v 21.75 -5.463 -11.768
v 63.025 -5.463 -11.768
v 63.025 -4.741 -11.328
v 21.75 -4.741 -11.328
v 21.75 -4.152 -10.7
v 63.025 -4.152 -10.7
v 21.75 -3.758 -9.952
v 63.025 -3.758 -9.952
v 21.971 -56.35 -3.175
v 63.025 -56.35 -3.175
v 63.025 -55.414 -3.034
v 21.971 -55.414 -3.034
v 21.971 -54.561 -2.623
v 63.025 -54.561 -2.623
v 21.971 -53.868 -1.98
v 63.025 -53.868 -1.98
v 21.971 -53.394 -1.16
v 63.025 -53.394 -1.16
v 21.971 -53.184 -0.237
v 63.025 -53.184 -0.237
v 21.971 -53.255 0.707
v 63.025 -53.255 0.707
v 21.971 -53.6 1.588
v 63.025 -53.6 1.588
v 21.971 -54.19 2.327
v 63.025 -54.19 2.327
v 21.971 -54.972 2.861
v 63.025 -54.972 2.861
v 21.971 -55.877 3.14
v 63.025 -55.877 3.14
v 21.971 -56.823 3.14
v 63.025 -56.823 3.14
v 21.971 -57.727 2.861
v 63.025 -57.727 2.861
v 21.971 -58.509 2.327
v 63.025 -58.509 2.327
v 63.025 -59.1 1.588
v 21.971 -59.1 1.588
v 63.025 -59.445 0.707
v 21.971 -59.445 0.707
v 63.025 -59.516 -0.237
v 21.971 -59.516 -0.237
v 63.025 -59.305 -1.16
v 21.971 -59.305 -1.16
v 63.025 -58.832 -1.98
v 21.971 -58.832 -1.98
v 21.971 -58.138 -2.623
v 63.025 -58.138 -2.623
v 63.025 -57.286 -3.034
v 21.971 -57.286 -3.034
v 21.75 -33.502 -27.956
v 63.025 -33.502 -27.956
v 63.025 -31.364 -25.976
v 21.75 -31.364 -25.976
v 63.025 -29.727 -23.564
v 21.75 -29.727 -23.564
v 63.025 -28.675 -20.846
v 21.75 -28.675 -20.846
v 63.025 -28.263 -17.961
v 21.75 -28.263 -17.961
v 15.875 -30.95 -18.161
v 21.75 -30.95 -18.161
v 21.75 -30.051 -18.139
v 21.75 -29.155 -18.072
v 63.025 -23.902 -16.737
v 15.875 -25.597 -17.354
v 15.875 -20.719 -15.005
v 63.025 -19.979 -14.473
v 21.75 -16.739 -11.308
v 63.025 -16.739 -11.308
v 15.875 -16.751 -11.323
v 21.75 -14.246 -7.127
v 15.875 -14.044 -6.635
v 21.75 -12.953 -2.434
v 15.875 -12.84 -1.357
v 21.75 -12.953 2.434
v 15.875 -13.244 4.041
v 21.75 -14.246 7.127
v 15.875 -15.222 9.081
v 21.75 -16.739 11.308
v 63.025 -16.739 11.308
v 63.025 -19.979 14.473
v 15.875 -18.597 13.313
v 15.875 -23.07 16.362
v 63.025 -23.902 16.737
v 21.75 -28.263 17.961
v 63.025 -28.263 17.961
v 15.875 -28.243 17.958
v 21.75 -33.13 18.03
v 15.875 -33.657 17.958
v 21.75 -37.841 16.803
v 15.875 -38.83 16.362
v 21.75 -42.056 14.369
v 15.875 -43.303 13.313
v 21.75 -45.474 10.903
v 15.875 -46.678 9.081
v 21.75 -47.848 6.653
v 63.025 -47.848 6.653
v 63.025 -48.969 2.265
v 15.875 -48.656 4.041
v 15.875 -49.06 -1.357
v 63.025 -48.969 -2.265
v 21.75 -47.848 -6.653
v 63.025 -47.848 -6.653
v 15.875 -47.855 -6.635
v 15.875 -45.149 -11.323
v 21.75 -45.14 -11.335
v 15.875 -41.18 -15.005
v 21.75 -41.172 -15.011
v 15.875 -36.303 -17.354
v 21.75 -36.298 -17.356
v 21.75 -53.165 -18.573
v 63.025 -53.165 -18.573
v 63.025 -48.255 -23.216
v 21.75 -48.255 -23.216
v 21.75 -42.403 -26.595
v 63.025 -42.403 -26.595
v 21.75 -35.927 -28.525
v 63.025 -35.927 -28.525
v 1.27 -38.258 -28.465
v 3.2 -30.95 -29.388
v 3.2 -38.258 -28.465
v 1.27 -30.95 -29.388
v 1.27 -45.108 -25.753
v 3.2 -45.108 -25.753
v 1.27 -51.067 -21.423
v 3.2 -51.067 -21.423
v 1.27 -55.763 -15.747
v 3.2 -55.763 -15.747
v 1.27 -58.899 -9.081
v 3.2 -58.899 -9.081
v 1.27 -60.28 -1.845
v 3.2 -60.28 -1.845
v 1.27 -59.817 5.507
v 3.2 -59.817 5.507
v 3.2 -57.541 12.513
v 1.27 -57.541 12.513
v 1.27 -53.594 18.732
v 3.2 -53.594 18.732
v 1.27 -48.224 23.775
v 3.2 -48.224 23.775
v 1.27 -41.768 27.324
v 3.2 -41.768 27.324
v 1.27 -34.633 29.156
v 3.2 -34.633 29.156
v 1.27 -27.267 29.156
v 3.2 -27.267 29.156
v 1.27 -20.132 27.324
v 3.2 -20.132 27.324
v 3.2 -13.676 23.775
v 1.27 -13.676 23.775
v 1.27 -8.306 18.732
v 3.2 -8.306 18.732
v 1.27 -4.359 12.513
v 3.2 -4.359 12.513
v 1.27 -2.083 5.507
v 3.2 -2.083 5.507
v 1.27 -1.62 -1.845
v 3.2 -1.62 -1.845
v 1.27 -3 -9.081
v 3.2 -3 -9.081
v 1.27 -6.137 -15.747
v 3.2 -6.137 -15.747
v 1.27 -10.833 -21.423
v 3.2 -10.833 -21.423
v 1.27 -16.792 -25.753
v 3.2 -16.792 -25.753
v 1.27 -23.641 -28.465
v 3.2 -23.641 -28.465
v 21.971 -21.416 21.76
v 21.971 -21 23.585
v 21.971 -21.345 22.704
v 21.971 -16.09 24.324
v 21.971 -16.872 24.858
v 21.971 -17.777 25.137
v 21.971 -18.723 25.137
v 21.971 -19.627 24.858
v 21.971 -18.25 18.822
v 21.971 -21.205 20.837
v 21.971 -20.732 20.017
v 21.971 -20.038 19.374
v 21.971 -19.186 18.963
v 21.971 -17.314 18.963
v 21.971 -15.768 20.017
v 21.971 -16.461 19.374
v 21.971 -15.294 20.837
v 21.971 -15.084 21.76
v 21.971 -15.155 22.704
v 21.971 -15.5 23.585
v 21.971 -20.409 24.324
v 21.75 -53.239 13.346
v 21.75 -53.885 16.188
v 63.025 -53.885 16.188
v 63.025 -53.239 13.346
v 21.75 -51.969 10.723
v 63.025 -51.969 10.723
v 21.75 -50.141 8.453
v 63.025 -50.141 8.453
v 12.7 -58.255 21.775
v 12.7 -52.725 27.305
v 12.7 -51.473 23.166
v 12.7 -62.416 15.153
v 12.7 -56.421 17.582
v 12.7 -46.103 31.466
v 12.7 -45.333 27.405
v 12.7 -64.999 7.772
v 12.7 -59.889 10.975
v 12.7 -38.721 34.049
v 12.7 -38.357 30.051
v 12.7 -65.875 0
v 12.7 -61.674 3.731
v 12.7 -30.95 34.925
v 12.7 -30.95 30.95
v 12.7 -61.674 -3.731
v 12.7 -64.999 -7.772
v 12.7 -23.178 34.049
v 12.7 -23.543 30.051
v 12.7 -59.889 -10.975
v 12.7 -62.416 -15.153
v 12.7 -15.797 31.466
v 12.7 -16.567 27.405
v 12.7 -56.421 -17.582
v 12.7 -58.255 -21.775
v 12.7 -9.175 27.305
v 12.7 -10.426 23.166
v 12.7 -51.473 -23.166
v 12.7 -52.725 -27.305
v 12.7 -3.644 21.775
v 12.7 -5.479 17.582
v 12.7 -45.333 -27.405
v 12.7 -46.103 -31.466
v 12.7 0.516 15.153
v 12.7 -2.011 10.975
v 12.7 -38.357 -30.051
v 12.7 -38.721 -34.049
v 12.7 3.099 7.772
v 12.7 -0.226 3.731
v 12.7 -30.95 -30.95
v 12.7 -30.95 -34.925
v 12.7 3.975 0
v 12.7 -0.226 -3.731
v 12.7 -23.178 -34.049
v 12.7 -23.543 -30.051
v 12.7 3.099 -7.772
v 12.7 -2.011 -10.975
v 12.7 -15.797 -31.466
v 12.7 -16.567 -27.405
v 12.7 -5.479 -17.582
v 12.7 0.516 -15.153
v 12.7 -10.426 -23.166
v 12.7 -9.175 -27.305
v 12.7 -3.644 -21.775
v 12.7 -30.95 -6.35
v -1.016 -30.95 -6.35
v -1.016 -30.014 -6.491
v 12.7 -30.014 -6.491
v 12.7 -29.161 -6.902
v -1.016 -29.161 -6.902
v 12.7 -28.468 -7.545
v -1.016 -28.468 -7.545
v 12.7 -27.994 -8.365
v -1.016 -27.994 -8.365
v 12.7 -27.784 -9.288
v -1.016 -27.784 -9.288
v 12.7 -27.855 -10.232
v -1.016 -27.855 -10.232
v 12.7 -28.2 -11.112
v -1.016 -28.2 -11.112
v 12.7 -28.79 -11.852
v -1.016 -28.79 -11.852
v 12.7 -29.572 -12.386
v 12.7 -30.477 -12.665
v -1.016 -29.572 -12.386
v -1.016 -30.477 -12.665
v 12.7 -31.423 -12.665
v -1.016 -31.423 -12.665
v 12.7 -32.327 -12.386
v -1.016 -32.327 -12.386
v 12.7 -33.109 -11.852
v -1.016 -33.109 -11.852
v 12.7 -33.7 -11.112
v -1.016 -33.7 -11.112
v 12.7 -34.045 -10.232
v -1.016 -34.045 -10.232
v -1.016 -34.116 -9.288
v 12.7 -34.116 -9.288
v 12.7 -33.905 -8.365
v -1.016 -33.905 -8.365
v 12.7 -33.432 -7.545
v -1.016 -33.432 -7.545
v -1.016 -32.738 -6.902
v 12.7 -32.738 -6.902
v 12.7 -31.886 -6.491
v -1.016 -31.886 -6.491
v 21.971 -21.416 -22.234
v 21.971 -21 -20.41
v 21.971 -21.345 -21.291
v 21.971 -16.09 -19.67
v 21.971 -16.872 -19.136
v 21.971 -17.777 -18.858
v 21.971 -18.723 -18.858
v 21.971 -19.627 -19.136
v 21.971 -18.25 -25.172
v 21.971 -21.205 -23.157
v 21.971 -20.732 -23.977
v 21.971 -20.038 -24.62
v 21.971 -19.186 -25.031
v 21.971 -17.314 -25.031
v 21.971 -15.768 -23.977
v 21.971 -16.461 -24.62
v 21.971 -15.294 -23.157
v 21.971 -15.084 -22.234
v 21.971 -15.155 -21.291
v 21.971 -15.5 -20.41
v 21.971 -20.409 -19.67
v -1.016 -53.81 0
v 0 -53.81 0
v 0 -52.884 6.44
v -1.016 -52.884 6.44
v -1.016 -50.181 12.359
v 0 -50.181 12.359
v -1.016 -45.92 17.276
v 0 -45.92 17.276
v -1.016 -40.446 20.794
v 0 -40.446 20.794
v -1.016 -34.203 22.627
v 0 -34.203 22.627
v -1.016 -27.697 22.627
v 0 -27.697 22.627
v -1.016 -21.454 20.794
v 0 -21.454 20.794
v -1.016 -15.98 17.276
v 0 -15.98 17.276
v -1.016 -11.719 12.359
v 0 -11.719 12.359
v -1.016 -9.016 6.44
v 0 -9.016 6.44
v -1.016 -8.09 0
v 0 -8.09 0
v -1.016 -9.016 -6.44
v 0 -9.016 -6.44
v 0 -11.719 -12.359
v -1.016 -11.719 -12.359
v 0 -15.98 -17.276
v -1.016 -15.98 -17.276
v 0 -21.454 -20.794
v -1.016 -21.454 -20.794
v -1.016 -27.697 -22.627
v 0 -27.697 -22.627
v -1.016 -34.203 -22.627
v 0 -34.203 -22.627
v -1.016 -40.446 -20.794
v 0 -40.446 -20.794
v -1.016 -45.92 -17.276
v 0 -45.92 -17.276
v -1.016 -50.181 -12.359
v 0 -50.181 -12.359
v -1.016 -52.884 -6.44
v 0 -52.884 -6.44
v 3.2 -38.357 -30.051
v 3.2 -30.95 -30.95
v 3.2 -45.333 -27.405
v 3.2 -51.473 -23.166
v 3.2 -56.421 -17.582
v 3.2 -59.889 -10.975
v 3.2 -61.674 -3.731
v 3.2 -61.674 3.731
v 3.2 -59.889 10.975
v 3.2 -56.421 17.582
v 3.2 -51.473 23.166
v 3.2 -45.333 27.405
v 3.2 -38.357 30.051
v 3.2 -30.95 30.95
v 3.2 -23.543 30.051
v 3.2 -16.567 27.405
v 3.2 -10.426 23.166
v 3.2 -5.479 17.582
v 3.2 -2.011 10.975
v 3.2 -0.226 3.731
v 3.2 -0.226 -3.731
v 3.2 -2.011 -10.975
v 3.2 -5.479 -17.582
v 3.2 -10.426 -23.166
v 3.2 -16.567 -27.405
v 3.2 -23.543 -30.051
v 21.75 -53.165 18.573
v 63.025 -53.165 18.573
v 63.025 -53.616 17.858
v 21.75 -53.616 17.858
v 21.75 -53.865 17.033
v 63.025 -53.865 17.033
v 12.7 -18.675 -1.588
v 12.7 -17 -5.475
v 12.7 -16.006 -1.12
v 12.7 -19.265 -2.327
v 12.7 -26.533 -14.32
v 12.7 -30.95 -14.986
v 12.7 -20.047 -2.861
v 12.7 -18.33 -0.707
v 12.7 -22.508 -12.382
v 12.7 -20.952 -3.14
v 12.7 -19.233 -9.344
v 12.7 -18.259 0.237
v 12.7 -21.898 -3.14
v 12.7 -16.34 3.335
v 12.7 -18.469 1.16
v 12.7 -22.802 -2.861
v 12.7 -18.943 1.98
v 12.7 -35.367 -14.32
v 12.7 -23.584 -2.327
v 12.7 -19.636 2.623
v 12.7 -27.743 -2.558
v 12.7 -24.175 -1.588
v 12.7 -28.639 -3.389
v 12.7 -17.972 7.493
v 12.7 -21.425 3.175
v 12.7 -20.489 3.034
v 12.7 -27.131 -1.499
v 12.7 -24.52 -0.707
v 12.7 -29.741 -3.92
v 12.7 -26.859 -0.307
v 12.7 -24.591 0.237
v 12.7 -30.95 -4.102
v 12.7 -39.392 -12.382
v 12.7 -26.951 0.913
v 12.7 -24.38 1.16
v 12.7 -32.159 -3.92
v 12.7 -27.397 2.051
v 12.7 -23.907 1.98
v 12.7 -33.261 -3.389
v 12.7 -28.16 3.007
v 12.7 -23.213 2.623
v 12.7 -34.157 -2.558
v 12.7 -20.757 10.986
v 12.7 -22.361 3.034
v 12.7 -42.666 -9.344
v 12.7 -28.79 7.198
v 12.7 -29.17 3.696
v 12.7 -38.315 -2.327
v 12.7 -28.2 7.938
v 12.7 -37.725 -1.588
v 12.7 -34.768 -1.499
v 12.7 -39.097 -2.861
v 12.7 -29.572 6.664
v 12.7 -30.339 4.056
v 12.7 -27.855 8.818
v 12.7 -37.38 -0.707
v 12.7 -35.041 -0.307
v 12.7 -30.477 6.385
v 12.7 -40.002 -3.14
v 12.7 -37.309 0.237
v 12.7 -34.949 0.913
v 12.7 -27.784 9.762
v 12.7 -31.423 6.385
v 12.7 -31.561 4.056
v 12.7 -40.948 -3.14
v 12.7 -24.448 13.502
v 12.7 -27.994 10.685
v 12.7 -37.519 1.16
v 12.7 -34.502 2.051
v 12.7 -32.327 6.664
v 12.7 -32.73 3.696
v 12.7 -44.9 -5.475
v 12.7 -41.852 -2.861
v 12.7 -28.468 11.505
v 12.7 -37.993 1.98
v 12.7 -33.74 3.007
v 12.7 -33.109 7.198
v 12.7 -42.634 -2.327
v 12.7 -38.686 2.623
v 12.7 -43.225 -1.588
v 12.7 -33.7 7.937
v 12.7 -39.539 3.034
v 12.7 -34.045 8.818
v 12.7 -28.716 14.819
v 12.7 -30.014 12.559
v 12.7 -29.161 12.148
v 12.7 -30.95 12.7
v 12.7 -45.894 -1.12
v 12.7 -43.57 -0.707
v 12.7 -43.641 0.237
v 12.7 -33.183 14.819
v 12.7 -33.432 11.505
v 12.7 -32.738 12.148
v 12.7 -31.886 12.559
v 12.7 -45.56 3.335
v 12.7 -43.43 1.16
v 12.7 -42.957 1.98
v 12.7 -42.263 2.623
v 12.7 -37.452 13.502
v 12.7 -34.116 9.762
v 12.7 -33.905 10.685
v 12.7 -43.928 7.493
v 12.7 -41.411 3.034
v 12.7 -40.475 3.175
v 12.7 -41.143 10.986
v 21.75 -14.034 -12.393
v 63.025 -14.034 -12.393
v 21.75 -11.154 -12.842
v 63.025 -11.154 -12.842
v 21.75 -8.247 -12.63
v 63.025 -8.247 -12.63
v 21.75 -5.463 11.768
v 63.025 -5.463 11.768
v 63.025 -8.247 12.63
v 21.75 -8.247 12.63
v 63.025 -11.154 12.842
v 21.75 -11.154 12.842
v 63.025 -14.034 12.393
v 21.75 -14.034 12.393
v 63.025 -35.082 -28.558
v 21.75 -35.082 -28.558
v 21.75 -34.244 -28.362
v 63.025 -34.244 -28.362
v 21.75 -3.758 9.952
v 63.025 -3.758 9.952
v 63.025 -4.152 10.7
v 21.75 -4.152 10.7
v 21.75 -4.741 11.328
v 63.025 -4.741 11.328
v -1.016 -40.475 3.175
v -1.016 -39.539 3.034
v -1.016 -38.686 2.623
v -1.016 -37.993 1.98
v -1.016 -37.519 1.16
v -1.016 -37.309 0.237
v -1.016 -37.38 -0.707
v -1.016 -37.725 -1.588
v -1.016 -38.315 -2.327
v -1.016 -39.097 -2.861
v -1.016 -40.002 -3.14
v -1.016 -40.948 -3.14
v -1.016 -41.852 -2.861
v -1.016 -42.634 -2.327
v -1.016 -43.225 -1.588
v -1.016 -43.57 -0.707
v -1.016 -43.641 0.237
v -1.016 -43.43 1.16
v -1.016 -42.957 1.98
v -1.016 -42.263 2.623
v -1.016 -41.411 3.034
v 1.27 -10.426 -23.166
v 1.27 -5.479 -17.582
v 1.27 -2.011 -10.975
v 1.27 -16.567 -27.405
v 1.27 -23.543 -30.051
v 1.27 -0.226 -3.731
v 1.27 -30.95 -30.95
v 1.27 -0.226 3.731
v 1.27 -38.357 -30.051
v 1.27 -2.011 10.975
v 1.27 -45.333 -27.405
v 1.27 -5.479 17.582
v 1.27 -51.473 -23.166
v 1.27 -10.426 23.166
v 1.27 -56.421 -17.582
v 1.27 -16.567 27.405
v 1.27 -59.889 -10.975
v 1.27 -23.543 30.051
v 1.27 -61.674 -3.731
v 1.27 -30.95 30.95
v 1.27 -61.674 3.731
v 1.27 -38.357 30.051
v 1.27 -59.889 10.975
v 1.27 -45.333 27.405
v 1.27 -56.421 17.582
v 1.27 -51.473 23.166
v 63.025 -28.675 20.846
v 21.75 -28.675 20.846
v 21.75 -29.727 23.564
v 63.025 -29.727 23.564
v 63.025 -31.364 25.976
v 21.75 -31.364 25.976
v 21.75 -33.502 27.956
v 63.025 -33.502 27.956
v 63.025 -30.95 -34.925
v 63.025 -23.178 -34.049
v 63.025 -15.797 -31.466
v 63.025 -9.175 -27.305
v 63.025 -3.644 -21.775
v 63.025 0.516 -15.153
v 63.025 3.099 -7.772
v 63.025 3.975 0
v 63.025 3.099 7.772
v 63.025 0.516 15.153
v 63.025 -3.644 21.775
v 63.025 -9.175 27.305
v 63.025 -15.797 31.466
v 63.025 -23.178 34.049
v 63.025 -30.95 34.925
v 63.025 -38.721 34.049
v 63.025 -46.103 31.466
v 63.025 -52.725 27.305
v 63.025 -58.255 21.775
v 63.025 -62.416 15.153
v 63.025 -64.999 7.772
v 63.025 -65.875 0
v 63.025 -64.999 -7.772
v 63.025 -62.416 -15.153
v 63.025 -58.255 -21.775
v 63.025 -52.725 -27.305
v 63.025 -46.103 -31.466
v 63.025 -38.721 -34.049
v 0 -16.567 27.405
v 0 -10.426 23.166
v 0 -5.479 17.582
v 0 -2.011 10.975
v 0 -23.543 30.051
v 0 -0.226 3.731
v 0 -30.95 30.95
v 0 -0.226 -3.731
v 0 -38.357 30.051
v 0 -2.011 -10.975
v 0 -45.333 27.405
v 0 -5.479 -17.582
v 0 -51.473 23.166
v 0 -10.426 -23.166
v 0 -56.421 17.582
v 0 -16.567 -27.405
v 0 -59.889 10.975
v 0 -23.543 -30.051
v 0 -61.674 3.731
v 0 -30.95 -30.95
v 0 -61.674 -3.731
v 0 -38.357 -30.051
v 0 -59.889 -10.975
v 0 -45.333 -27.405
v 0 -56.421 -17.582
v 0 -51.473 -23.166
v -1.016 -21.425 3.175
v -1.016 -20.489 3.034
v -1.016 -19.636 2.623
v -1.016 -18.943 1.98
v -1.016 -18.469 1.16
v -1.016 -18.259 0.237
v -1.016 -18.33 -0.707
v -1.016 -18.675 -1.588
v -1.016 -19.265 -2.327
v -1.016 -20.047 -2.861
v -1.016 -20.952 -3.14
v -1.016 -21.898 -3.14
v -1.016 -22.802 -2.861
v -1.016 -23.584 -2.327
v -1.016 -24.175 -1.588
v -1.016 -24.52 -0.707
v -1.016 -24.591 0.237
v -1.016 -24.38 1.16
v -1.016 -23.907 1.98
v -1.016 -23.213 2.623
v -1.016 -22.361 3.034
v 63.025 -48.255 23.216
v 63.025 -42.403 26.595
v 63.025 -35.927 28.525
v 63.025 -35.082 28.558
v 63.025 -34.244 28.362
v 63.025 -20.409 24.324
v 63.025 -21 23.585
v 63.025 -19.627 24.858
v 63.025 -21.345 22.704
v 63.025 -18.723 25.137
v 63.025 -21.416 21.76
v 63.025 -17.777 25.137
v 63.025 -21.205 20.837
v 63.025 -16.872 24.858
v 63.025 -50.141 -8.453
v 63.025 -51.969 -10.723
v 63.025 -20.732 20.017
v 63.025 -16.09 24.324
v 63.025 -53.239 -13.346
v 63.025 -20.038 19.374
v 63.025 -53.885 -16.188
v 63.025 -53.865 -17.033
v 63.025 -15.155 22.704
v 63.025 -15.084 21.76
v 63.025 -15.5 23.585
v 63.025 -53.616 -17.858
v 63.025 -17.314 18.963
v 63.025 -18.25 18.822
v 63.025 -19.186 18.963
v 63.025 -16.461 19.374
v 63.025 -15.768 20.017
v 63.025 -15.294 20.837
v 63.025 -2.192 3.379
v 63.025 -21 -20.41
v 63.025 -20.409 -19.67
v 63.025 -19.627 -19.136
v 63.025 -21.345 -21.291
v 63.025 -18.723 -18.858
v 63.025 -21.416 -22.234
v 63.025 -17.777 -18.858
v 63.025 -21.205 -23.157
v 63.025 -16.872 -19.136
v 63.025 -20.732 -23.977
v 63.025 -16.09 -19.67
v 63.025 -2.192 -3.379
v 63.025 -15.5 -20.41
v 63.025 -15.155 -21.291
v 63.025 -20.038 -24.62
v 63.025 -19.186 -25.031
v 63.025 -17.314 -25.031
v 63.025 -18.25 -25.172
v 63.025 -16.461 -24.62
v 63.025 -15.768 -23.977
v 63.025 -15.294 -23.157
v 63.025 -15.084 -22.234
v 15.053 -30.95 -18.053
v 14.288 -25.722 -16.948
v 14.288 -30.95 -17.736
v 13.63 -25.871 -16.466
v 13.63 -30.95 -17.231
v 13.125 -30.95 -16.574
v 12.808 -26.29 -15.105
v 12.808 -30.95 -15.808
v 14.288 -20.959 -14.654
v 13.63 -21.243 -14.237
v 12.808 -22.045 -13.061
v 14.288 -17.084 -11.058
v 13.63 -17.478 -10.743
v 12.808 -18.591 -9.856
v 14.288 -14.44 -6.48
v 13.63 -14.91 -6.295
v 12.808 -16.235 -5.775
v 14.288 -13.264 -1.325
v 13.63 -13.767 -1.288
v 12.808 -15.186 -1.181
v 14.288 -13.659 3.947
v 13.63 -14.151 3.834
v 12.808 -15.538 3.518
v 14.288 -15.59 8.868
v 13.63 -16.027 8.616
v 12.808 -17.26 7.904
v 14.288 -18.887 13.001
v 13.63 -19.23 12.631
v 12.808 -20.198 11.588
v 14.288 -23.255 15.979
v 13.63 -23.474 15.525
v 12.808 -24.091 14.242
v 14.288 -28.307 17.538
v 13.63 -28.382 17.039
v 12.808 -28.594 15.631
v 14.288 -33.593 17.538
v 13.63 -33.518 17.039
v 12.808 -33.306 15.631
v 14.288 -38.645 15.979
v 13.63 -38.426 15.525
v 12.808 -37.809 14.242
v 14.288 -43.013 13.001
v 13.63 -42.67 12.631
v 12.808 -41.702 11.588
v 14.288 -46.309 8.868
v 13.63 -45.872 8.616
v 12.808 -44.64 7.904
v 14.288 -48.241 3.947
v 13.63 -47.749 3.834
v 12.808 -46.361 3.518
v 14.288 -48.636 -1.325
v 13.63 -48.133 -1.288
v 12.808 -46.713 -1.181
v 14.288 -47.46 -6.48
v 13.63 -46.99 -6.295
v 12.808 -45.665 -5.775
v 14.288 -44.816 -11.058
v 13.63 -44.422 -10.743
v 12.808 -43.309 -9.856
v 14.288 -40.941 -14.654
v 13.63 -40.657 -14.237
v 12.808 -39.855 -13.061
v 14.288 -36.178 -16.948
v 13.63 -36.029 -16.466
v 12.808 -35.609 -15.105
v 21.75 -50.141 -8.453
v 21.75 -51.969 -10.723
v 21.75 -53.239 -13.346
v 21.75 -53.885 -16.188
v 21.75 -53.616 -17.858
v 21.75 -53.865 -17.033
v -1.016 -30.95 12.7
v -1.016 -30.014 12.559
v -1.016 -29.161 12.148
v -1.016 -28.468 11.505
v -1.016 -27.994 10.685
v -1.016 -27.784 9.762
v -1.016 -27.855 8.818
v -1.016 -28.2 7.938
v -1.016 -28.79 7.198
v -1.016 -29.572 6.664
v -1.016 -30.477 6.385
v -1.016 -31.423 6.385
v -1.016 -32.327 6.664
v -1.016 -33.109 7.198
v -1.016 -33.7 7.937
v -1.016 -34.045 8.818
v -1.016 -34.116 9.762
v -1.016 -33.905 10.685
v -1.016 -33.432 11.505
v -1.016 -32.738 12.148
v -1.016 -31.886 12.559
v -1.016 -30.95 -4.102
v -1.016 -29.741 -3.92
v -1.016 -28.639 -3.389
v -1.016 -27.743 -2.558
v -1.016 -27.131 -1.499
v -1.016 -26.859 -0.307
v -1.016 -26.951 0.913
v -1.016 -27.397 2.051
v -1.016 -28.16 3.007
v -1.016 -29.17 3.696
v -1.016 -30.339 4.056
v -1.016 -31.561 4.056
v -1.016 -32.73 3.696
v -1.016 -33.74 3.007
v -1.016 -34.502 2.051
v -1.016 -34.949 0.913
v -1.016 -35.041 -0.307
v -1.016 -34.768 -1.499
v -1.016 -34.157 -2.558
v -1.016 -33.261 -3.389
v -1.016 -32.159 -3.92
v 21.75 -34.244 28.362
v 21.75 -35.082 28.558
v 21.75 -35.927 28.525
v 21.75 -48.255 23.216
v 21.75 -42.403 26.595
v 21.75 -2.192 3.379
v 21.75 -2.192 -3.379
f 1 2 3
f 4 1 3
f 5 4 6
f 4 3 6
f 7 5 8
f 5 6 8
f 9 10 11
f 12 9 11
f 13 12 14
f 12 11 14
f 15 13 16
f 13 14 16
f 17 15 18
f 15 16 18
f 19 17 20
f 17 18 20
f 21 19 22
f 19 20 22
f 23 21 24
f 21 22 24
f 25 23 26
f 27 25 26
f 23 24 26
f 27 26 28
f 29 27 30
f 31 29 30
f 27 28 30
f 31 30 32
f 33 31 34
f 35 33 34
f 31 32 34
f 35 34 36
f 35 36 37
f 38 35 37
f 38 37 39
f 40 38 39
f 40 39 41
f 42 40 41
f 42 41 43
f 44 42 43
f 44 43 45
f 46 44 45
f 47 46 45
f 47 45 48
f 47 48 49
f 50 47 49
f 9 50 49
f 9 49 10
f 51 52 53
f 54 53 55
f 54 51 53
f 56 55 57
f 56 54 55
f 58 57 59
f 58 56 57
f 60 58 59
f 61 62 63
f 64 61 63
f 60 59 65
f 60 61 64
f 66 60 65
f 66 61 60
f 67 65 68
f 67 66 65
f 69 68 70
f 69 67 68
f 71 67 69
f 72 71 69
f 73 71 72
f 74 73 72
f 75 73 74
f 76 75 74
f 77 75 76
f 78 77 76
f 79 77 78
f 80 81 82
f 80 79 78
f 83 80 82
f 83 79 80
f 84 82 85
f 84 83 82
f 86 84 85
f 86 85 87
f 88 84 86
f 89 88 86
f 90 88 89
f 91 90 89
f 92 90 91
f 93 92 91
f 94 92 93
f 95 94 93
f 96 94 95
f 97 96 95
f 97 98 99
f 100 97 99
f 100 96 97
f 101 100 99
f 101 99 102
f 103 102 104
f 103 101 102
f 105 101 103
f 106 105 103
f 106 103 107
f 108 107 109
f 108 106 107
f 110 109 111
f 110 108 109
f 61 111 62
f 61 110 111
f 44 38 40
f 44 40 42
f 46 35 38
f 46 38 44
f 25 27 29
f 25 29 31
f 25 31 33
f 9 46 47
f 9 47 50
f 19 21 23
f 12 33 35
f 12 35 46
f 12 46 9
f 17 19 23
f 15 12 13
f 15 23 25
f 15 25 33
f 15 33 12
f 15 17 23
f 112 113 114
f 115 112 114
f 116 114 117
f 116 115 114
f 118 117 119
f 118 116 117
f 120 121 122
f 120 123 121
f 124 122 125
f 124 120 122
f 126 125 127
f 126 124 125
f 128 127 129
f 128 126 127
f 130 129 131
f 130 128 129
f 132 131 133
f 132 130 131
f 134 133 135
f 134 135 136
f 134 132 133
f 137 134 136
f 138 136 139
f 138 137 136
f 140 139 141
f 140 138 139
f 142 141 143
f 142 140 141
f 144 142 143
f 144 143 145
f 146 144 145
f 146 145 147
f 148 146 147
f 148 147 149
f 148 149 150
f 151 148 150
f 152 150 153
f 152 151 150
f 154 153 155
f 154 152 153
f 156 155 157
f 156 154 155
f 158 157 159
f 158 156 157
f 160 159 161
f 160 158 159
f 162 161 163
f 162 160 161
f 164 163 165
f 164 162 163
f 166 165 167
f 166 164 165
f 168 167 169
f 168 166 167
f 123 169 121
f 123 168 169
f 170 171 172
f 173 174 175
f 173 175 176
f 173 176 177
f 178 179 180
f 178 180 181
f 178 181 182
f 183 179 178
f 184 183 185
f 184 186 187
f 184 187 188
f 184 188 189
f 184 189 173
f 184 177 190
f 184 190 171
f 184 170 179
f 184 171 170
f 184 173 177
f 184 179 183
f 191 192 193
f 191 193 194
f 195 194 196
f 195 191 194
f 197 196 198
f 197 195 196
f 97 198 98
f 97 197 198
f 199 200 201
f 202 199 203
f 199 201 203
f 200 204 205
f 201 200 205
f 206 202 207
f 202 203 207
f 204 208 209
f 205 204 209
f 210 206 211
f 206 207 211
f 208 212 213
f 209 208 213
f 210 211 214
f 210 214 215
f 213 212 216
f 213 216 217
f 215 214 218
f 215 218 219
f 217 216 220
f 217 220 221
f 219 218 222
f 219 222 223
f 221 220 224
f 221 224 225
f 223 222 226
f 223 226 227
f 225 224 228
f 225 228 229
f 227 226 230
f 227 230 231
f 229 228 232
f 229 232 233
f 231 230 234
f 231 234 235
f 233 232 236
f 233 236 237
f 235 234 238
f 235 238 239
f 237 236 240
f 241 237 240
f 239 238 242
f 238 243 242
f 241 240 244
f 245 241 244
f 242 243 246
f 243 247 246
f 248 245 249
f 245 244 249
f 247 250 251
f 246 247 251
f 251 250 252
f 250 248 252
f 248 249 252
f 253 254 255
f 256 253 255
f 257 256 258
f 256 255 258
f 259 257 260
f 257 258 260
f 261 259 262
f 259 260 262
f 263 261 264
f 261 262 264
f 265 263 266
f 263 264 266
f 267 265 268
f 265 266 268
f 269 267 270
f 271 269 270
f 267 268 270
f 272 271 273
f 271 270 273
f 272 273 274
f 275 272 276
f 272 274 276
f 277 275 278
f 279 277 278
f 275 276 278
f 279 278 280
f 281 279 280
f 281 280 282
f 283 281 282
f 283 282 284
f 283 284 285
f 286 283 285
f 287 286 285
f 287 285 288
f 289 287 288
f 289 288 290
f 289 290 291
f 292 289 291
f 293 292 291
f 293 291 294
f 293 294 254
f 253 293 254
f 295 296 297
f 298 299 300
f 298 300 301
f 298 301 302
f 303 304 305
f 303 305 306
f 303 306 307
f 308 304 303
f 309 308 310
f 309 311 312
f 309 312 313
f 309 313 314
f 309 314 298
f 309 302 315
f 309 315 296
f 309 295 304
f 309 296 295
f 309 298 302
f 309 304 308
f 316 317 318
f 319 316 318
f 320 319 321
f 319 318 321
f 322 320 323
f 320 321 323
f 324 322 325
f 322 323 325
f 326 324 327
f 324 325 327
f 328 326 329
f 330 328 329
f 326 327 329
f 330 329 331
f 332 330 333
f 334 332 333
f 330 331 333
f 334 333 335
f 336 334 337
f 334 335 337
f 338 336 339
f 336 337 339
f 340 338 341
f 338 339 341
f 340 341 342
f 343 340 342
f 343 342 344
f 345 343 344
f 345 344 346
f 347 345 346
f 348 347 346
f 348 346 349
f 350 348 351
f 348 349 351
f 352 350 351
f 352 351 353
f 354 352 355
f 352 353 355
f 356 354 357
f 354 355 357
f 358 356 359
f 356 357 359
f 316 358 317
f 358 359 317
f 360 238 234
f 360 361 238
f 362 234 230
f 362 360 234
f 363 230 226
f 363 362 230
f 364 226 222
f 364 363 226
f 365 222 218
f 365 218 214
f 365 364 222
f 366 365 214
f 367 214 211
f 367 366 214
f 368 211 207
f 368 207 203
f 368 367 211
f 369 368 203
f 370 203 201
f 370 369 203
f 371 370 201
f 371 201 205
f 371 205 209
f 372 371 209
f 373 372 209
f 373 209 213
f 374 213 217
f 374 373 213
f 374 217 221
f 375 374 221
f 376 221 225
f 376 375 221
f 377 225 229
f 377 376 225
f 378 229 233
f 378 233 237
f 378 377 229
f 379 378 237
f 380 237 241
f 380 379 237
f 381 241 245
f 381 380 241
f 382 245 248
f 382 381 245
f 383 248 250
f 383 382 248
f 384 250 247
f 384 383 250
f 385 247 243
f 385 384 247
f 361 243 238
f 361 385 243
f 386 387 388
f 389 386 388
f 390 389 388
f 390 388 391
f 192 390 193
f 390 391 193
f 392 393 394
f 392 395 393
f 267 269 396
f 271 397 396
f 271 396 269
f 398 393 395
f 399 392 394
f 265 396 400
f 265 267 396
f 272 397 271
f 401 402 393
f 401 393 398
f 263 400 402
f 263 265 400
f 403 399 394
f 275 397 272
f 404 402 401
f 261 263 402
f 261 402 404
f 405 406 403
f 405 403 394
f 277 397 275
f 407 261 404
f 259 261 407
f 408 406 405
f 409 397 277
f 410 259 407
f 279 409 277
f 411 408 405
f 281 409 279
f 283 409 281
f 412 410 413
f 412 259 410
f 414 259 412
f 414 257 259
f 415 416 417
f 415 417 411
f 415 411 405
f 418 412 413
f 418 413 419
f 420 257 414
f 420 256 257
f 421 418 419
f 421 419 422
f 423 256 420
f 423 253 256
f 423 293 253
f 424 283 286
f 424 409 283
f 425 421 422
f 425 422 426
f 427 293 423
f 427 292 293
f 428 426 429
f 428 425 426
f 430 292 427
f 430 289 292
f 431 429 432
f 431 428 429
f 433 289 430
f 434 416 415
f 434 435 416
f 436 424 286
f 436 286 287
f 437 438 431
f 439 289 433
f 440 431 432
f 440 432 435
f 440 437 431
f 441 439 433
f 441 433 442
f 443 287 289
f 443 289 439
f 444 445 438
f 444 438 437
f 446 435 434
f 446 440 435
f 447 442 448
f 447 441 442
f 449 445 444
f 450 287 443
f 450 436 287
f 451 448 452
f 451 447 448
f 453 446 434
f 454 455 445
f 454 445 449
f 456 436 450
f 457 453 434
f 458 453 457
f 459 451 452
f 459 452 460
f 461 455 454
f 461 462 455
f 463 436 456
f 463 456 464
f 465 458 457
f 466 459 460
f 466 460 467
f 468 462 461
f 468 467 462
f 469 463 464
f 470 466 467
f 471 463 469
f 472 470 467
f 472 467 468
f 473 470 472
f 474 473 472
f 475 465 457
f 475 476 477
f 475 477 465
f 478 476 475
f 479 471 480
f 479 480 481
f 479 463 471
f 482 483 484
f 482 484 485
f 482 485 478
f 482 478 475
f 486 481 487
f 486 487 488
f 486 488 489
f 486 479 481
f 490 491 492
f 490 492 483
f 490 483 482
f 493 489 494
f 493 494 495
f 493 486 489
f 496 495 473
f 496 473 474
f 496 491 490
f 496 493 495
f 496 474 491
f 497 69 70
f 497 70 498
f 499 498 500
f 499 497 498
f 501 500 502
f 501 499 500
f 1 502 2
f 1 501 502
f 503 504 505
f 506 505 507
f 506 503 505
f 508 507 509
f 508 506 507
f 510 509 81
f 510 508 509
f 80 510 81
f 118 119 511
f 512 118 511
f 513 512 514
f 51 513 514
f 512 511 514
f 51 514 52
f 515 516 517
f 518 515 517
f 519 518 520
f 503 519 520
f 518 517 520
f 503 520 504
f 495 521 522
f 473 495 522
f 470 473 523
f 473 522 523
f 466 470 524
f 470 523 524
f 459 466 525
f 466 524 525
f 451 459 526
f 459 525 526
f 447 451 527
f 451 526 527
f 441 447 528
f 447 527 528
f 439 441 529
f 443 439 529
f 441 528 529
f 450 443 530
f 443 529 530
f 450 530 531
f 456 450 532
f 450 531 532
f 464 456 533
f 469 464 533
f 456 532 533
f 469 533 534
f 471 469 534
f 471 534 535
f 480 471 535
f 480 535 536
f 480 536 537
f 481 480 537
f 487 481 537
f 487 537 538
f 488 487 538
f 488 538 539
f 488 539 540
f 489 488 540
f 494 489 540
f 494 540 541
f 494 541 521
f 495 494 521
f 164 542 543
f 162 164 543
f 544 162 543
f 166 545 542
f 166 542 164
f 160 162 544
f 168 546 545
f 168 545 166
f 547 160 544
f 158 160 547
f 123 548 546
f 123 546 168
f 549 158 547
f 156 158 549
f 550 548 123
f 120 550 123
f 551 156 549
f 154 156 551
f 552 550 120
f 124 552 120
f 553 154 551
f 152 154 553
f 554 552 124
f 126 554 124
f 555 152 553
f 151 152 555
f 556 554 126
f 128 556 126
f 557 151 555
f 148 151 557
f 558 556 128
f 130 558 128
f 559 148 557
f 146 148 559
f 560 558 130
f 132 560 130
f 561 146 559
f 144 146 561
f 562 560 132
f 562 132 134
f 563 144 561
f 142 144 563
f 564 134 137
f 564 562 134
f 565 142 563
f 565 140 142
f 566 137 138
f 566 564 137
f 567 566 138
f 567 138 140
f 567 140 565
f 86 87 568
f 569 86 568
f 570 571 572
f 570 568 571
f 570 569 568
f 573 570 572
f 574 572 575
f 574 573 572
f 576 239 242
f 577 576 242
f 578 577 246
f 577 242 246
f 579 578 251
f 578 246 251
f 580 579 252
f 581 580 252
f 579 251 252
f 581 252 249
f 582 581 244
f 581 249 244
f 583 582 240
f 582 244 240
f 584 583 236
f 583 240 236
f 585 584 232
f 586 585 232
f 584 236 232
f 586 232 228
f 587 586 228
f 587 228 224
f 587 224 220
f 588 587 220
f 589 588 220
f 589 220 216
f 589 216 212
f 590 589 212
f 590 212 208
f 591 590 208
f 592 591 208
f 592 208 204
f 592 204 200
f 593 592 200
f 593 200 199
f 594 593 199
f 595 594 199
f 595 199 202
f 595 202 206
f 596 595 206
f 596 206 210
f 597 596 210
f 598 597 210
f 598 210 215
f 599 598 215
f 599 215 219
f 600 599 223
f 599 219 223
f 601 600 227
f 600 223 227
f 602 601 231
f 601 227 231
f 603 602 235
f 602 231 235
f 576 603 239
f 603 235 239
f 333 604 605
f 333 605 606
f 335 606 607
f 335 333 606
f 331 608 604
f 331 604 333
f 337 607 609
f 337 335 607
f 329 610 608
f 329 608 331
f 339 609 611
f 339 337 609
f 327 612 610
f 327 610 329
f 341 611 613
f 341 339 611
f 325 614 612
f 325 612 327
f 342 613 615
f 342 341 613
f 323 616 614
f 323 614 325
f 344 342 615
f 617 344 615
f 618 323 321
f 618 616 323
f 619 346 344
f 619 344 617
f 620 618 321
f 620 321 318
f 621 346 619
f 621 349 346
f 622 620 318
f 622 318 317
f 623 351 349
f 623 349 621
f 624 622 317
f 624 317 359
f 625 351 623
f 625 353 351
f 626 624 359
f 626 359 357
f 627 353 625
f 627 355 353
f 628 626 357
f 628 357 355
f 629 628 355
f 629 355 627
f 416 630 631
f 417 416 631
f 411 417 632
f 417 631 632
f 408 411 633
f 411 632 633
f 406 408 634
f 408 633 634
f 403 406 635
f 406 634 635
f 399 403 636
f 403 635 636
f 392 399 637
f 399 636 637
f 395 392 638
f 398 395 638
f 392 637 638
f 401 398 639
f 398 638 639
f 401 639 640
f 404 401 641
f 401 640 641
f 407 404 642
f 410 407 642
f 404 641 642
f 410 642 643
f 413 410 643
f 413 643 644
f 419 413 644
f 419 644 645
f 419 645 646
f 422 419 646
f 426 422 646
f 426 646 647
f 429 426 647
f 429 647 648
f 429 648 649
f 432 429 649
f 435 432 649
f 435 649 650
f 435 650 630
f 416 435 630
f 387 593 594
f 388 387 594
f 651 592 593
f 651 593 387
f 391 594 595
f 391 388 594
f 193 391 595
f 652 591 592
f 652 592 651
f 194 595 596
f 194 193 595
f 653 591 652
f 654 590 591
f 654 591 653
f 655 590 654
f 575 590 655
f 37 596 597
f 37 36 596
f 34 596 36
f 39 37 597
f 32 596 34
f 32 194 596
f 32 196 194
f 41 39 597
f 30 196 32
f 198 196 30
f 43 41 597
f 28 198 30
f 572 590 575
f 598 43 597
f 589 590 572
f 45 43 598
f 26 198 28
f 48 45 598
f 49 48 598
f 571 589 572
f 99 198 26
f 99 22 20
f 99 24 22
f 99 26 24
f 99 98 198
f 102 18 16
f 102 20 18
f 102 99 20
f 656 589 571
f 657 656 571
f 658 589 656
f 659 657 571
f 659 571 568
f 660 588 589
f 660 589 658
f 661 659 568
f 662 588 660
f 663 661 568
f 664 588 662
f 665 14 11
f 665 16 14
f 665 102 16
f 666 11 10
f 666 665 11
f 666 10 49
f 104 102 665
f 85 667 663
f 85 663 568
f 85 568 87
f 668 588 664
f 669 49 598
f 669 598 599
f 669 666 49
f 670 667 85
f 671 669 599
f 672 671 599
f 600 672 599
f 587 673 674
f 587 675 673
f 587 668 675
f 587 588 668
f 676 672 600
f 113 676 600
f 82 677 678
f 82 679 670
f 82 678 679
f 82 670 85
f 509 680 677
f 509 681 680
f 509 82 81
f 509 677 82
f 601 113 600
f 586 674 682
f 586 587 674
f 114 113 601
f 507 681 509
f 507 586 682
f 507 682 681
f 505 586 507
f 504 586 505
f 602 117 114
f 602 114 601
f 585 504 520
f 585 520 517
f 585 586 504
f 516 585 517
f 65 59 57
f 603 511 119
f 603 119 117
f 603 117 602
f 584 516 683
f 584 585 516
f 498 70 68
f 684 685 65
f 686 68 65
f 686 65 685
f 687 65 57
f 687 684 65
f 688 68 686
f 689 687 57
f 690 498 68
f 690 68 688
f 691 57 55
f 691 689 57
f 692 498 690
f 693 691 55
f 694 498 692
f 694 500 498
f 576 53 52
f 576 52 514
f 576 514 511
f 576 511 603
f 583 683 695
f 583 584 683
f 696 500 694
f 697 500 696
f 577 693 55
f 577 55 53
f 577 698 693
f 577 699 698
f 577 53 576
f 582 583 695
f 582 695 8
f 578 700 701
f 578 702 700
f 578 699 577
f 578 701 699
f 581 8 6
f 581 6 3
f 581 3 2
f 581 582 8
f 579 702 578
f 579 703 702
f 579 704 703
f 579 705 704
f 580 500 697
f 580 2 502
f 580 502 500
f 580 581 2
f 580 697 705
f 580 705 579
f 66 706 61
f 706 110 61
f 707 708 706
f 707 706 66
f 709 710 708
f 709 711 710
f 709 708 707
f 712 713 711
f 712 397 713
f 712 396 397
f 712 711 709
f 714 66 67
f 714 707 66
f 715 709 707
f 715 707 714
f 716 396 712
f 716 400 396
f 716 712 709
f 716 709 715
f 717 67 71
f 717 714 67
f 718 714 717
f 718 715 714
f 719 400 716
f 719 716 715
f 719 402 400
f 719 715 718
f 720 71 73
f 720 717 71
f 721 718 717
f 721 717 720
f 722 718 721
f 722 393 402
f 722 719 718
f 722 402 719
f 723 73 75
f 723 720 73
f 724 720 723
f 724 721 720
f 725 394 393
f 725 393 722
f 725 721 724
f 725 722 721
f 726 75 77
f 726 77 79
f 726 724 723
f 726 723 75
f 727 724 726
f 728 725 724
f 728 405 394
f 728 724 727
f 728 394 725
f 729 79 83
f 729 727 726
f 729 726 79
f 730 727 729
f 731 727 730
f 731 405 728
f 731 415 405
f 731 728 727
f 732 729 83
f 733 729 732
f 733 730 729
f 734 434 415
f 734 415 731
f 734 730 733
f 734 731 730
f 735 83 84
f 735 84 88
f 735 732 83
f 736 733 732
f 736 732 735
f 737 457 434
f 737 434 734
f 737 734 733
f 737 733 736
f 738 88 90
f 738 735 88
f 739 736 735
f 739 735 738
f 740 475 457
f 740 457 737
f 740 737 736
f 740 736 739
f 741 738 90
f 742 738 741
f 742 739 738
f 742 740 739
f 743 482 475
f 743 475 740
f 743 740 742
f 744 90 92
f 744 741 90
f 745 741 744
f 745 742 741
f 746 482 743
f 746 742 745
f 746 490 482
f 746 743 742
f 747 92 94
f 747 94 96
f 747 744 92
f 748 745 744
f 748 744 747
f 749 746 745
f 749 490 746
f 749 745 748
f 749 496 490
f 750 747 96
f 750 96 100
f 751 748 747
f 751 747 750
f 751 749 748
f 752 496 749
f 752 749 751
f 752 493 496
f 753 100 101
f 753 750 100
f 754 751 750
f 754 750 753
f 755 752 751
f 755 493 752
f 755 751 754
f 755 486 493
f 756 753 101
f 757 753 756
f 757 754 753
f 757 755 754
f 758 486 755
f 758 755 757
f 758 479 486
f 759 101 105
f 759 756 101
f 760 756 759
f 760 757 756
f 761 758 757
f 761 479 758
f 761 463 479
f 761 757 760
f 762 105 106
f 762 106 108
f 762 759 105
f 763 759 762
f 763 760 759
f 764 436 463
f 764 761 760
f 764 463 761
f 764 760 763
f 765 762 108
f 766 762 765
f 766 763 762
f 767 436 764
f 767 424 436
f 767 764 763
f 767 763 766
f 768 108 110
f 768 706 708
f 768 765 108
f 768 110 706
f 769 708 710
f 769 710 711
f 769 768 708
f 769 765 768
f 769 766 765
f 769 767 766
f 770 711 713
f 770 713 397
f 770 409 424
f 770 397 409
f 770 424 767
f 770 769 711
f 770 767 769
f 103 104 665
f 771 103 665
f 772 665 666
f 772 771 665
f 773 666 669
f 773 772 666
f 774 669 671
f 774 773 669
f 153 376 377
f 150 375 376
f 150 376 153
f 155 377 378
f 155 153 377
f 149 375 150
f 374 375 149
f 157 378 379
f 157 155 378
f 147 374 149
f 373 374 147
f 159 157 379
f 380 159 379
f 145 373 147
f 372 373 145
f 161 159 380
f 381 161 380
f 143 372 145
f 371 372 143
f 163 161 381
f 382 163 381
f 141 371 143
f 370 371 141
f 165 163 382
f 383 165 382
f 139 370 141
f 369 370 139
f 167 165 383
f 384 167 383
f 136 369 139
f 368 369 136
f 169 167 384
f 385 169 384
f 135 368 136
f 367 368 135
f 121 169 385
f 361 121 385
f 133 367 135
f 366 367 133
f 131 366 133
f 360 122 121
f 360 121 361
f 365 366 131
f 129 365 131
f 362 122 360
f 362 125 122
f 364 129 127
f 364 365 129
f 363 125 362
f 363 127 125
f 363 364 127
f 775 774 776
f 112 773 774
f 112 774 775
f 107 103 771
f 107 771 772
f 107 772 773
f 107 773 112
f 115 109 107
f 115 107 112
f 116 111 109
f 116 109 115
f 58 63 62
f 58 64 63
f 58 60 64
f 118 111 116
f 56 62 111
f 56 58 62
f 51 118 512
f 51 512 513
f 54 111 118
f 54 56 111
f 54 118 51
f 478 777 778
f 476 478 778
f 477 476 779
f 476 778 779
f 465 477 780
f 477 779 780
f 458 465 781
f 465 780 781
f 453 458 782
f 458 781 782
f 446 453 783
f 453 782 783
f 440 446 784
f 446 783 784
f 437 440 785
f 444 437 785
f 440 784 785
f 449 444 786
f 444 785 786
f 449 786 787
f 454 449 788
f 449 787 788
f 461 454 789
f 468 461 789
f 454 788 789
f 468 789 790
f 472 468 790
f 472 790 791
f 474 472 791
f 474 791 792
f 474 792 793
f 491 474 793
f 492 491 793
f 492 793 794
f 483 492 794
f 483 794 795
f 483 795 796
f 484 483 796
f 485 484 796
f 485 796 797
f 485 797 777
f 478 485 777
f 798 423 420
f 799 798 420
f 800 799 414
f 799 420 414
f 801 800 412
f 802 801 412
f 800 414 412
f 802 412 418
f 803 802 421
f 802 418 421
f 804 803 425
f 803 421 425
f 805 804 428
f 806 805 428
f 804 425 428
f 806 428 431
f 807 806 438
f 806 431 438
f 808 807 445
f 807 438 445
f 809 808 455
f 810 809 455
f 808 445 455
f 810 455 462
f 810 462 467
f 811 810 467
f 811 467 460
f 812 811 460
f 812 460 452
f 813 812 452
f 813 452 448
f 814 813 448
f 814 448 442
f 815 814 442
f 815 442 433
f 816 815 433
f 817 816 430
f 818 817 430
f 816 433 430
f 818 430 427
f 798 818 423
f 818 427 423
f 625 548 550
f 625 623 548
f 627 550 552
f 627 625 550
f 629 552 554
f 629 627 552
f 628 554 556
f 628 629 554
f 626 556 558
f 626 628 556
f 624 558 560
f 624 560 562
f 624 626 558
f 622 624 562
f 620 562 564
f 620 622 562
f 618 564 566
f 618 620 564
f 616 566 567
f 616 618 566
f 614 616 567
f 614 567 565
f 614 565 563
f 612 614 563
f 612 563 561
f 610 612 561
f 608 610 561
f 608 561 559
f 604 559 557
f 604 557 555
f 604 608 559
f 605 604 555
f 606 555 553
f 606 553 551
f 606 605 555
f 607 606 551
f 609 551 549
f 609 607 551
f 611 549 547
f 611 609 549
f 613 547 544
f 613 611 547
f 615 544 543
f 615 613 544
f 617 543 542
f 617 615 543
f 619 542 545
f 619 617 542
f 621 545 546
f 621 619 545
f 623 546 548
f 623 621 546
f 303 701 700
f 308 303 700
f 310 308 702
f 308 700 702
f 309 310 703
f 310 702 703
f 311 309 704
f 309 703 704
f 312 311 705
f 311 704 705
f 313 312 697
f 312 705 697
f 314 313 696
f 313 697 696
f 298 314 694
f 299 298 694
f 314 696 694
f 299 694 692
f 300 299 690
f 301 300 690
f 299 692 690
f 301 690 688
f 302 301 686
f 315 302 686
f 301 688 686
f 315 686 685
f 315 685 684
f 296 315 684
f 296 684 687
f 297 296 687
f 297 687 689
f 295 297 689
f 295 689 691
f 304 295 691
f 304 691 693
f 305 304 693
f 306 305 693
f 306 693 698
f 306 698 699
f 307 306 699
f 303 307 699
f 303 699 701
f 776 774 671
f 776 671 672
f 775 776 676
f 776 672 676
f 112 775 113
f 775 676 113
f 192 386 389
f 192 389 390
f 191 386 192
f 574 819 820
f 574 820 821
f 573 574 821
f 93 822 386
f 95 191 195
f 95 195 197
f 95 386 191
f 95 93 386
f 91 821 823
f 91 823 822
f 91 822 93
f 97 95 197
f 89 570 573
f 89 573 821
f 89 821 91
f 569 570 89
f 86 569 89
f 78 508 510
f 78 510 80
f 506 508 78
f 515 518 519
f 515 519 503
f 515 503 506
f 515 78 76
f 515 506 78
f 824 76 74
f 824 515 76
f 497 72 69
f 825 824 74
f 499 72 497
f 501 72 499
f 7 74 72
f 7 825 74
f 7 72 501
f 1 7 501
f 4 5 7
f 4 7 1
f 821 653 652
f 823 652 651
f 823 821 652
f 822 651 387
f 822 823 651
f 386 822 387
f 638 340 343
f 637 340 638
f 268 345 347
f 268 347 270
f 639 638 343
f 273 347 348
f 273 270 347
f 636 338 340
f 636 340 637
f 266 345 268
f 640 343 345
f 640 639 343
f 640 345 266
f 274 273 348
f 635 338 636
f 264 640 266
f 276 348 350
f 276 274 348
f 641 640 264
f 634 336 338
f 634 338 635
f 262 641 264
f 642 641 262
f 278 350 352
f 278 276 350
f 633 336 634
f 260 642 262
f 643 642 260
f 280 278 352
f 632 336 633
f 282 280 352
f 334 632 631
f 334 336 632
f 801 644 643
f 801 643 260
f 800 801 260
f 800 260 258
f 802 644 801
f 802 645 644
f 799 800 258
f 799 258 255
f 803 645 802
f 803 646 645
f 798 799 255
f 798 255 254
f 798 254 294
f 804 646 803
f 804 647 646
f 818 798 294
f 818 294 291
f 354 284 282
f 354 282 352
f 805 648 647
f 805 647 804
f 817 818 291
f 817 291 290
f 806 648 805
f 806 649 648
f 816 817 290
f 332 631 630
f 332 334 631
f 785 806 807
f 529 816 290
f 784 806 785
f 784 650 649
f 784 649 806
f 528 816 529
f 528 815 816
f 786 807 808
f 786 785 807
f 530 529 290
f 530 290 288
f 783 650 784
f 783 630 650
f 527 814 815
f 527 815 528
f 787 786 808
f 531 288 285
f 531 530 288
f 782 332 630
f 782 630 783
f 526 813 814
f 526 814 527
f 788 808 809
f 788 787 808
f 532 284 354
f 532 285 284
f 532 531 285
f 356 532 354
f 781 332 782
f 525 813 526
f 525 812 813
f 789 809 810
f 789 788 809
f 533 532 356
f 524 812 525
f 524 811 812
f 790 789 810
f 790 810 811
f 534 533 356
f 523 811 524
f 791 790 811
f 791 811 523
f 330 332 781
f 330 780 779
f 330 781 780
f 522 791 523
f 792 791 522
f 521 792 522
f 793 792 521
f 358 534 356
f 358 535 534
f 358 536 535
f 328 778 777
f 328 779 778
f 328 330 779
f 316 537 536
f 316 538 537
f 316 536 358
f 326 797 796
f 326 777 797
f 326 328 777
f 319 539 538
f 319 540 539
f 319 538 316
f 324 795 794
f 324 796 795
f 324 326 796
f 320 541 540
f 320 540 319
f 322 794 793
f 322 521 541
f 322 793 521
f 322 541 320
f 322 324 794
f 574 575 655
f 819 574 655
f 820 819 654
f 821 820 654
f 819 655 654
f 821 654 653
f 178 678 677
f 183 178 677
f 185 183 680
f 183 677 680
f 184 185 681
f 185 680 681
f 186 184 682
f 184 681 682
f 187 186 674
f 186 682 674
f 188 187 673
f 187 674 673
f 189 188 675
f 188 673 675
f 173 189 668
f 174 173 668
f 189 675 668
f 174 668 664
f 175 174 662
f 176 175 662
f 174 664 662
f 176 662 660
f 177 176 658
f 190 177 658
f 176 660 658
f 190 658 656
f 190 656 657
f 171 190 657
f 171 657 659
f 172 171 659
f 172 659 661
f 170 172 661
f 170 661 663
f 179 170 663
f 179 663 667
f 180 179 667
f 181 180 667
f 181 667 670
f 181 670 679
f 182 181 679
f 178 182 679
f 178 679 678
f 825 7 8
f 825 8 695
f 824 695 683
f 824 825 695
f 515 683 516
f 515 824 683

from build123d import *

# Parameters (mm, degrees)
SKETCH4_R                  = 34.925
SKETCH4_R_2                = 18.161
BOSS_EXTRUDE1_DEPTH        = 72.771
CUT_EXTRUDE2_REACH         = 137.172
CUT_EXTRUDE2_START         = 21.75002
TRIPOD_WALLS_R             = 3.175
BOLT_HOLE_FACE_R           = 3.175
SKETCH12_R                 = 3.175
CUT_EXTRUDE3_DEPTH         = 63.5
CUT_EXTRUDE4_START         = -22.44598
SKETCH13_R                 = 34.925
CUT_EXTRUDE4_DEPTH         = 22.44598
SKETCH16_R                 = 22.86
COMPENSATING_SPACING_DEPTH = 1.016
F_1_4_0_2500_DOWEL_HOLE1_D = 6.35
BOLT_CIRCLE_PATTERN_2_R    = 4.1021
F_5_16_CLEARNCE_DEPTH      = 13.716


with BuildPart() as part:
    # Sketch2 → Revolve1 (revolve)
    with BuildSketch(Plane.XY, mode=Mode.PRIVATE) as revolve1_sk:
        Polygon((0, 0), (0, -30.9499), (12.7, -30.9499), (12.7, 0), (3.2004, 0), (3.2004, -1.5621), (1.27, -1.5621), (1.27, 0), align=None)
    revolve(revolve1_sk.sketch.rotate(Axis((11.964521893, -30.9499, 0), (-1, 0, 0)), 90), axis=Axis((11.964521893, -30.9499, 0), (-1, 0, 0)))

    # Sketch4 → Boss-Extrude1 (add)
    with BuildSketch(Plane(origin=(12.7, 0, 0), x_dir=(0, 0, -1), z_dir=(1, 0, 0))):
        with Locations((0, -30.9499)):
            Circle(SKETCH4_R)
        with Locations((0, -30.9499)):
            Circle(SKETCH4_R_2, mode=Mode.SUBTRACT)
    extrude(amount=BOSS_EXTRUDE1_DEPTH)

    # Sketch5 → Cut-Extrude2 (cut, up to next)
    with BuildSketch(Plane(origin=(0, 0, 0), x_dir=(0, 0, -1), z_dir=(1, 0, 0)).offset(CUT_EXTRUDE2_START), mode=Mode.PRIVATE) as cut_extrude2_sk1:
        with BuildLine():
            ThreePointArc((-11.141810341, -4.2233215), (0, -23.4823), (11.141810341, -4.2233215))
            ThreePointArc((11.141810341, -4.2233215), (0, -1.9939), (-11.141810341, -4.2233215))
        make_face()
    cut_extrude2_tool1 = extrude(cut_extrude2_sk1.sketch, amount=CUT_EXTRUDE2_REACH, mode=Mode.PRIVATE) & part.part
    # Sketch5 → Cut-Extrude2 (cut, up to next)
    with BuildSketch(Plane(origin=(0, 0, 0), x_dir=(0, 0, -1), z_dir=(1, 0, 0)).offset(CUT_EXTRUDE2_START), mode=Mode.PRIVATE) as cut_extrude2_sk2:
        with BuildLine():
            ThreePointArc((-28.716801071, -34.664098733), (-25.076631449, -45.427900247), (-17.57499054, -53.962280223))
            ThreePointArc((-17.57499054, -53.962280223), (-6.467131268, -34.683700064), (-28.716801071, -34.664098733))
        make_face()
    cut_extrude2_tool2 = extrude(cut_extrude2_sk2.sketch, amount=CUT_EXTRUDE2_REACH, mode=Mode.PRIVATE) & part.part
    # Sketch5 → Cut-Extrude2 (cut, up to next)
    with BuildSketch(Plane(origin=(0, 0, 0), x_dir=(0, 0, -1), z_dir=(1, 0, 0)).offset(CUT_EXTRUDE2_START), mode=Mode.PRIVATE) as cut_extrude2_sk3:
        with BuildLine():
            ThreePointArc((28.716801071, -34.664098733), (6.467131268, -34.683700064), (17.57499054, -53.962280223))
            ThreePointArc((17.57499054, -53.962280223), (25.076631449, -45.427900247), (28.716801071, -34.664098733))
        make_face()
    cut_extrude2_tool3 = extrude(cut_extrude2_sk3.sketch, amount=CUT_EXTRUDE2_REACH, mode=Mode.PRIVATE) & part.part
    add(cut_extrude2_tool1.solids().sort_by_distance((21.75002, -12.135894, 0))[0], mode=Mode.SUBTRACT)
    add(cut_extrude2_tool2.solids().sort_by_distance((21.75002, -40.356903, 16.293407))[0], mode=Mode.SUBTRACT)
    add(cut_extrude2_tool3.solids().sort_by_distance((21.75002, -40.356903, -16.293407))[0], mode=Mode.SUBTRACT)

    # Tripod walls
    tripod_walls_edges = [part.edges().sort_by_distance(p)[0] for p in [
        (53.61051, -4.2233215, 11.141810341),
        (53.61051, -4.2233215, -11.141810341),
        (53.61051, -53.962280223, 17.57499054),
        (53.61051, -34.664098733, 28.716801071),
        (53.61051, -34.664098733, -28.716801071),
        (53.61051, -53.962280223, -17.57499054),
    ]]
    fillet(tripod_walls_edges, radius=TRIPOD_WALLS_R)

    # Bolt Hole Face
    bolt_hole_face_edges = [part.edges().sort_by_distance(p)[0] for p in [
        (12.7, -30.9499, 18.161),
    ]]
    fillet(bolt_hole_face_edges, radius=BOLT_HOLE_FACE_R)

    # Sketch12 → Cut-Extrude3 (cut)
    with BuildSketch(Plane(origin=(85.471, 0, 0), x_dir=(0, 0, -1), z_dir=(1, 0, 0))):
        with Locations((-21.997045256, -18.2499)):
            Circle(SKETCH12_R)
        with Locations((21.997045256, -18.2499)):
            Circle(SKETCH12_R)
        with Locations((0, -56.3499)):
            Circle(SKETCH12_R)
    extrude(amount=-CUT_EXTRUDE3_DEPTH, mode=Mode.SUBTRACT)

    # Sketch13 → Cut-Extrude4 (cut)
    with BuildSketch(Plane(origin=(85.471, 0, 0), x_dir=(0, 0, -1), z_dir=(1, 0, 0)).offset(CUT_EXTRUDE4_START)):
        with Locations((0, -30.9499)):
            Circle(SKETCH13_R)
    extrude(amount=CUT_EXTRUDE4_DEPTH, mode=Mode.SUBTRACT)

    # Sketch16 → Compensating Spacing (add)
    with BuildSketch(Plane.ZY):
        with Locations(Location((0, -30.9499, 0), (0, 0, 270))):
            Circle(SKETCH16_R)
    extrude(amount=COMPENSATING_SPACING_DEPTH)

    # 1/4 (0.2500) Dowel Hole1 (through all)
    with Locations(Plane(origin=(12.7, 0, 0), x_dir=(0, 0, -1), z_dir=(1, 0, 0))):
        with Locations((0, -21.4249), (9.525, -30.9499), (0, -40.4749), (-9.525, -30.9499)):
            Hole(F_1_4_0_2500_DOWEL_HOLE1_D / 2)

    # Bolt Circle Pattern<2> → 5/16 Clearnce (cut)
    with BuildSketch(Plane(origin=(12.7, 0, 0), x_dir=(0, 0, -1), z_dir=(1, 0, 0))):
        with Locations((0, -30.9499)):
            Circle(BOLT_CIRCLE_PATTERN_2_R)
    extrude(amount=-F_5_16_CLEARNCE_DEPTH, mode=Mode.SUBTRACT)


solid = part.part
